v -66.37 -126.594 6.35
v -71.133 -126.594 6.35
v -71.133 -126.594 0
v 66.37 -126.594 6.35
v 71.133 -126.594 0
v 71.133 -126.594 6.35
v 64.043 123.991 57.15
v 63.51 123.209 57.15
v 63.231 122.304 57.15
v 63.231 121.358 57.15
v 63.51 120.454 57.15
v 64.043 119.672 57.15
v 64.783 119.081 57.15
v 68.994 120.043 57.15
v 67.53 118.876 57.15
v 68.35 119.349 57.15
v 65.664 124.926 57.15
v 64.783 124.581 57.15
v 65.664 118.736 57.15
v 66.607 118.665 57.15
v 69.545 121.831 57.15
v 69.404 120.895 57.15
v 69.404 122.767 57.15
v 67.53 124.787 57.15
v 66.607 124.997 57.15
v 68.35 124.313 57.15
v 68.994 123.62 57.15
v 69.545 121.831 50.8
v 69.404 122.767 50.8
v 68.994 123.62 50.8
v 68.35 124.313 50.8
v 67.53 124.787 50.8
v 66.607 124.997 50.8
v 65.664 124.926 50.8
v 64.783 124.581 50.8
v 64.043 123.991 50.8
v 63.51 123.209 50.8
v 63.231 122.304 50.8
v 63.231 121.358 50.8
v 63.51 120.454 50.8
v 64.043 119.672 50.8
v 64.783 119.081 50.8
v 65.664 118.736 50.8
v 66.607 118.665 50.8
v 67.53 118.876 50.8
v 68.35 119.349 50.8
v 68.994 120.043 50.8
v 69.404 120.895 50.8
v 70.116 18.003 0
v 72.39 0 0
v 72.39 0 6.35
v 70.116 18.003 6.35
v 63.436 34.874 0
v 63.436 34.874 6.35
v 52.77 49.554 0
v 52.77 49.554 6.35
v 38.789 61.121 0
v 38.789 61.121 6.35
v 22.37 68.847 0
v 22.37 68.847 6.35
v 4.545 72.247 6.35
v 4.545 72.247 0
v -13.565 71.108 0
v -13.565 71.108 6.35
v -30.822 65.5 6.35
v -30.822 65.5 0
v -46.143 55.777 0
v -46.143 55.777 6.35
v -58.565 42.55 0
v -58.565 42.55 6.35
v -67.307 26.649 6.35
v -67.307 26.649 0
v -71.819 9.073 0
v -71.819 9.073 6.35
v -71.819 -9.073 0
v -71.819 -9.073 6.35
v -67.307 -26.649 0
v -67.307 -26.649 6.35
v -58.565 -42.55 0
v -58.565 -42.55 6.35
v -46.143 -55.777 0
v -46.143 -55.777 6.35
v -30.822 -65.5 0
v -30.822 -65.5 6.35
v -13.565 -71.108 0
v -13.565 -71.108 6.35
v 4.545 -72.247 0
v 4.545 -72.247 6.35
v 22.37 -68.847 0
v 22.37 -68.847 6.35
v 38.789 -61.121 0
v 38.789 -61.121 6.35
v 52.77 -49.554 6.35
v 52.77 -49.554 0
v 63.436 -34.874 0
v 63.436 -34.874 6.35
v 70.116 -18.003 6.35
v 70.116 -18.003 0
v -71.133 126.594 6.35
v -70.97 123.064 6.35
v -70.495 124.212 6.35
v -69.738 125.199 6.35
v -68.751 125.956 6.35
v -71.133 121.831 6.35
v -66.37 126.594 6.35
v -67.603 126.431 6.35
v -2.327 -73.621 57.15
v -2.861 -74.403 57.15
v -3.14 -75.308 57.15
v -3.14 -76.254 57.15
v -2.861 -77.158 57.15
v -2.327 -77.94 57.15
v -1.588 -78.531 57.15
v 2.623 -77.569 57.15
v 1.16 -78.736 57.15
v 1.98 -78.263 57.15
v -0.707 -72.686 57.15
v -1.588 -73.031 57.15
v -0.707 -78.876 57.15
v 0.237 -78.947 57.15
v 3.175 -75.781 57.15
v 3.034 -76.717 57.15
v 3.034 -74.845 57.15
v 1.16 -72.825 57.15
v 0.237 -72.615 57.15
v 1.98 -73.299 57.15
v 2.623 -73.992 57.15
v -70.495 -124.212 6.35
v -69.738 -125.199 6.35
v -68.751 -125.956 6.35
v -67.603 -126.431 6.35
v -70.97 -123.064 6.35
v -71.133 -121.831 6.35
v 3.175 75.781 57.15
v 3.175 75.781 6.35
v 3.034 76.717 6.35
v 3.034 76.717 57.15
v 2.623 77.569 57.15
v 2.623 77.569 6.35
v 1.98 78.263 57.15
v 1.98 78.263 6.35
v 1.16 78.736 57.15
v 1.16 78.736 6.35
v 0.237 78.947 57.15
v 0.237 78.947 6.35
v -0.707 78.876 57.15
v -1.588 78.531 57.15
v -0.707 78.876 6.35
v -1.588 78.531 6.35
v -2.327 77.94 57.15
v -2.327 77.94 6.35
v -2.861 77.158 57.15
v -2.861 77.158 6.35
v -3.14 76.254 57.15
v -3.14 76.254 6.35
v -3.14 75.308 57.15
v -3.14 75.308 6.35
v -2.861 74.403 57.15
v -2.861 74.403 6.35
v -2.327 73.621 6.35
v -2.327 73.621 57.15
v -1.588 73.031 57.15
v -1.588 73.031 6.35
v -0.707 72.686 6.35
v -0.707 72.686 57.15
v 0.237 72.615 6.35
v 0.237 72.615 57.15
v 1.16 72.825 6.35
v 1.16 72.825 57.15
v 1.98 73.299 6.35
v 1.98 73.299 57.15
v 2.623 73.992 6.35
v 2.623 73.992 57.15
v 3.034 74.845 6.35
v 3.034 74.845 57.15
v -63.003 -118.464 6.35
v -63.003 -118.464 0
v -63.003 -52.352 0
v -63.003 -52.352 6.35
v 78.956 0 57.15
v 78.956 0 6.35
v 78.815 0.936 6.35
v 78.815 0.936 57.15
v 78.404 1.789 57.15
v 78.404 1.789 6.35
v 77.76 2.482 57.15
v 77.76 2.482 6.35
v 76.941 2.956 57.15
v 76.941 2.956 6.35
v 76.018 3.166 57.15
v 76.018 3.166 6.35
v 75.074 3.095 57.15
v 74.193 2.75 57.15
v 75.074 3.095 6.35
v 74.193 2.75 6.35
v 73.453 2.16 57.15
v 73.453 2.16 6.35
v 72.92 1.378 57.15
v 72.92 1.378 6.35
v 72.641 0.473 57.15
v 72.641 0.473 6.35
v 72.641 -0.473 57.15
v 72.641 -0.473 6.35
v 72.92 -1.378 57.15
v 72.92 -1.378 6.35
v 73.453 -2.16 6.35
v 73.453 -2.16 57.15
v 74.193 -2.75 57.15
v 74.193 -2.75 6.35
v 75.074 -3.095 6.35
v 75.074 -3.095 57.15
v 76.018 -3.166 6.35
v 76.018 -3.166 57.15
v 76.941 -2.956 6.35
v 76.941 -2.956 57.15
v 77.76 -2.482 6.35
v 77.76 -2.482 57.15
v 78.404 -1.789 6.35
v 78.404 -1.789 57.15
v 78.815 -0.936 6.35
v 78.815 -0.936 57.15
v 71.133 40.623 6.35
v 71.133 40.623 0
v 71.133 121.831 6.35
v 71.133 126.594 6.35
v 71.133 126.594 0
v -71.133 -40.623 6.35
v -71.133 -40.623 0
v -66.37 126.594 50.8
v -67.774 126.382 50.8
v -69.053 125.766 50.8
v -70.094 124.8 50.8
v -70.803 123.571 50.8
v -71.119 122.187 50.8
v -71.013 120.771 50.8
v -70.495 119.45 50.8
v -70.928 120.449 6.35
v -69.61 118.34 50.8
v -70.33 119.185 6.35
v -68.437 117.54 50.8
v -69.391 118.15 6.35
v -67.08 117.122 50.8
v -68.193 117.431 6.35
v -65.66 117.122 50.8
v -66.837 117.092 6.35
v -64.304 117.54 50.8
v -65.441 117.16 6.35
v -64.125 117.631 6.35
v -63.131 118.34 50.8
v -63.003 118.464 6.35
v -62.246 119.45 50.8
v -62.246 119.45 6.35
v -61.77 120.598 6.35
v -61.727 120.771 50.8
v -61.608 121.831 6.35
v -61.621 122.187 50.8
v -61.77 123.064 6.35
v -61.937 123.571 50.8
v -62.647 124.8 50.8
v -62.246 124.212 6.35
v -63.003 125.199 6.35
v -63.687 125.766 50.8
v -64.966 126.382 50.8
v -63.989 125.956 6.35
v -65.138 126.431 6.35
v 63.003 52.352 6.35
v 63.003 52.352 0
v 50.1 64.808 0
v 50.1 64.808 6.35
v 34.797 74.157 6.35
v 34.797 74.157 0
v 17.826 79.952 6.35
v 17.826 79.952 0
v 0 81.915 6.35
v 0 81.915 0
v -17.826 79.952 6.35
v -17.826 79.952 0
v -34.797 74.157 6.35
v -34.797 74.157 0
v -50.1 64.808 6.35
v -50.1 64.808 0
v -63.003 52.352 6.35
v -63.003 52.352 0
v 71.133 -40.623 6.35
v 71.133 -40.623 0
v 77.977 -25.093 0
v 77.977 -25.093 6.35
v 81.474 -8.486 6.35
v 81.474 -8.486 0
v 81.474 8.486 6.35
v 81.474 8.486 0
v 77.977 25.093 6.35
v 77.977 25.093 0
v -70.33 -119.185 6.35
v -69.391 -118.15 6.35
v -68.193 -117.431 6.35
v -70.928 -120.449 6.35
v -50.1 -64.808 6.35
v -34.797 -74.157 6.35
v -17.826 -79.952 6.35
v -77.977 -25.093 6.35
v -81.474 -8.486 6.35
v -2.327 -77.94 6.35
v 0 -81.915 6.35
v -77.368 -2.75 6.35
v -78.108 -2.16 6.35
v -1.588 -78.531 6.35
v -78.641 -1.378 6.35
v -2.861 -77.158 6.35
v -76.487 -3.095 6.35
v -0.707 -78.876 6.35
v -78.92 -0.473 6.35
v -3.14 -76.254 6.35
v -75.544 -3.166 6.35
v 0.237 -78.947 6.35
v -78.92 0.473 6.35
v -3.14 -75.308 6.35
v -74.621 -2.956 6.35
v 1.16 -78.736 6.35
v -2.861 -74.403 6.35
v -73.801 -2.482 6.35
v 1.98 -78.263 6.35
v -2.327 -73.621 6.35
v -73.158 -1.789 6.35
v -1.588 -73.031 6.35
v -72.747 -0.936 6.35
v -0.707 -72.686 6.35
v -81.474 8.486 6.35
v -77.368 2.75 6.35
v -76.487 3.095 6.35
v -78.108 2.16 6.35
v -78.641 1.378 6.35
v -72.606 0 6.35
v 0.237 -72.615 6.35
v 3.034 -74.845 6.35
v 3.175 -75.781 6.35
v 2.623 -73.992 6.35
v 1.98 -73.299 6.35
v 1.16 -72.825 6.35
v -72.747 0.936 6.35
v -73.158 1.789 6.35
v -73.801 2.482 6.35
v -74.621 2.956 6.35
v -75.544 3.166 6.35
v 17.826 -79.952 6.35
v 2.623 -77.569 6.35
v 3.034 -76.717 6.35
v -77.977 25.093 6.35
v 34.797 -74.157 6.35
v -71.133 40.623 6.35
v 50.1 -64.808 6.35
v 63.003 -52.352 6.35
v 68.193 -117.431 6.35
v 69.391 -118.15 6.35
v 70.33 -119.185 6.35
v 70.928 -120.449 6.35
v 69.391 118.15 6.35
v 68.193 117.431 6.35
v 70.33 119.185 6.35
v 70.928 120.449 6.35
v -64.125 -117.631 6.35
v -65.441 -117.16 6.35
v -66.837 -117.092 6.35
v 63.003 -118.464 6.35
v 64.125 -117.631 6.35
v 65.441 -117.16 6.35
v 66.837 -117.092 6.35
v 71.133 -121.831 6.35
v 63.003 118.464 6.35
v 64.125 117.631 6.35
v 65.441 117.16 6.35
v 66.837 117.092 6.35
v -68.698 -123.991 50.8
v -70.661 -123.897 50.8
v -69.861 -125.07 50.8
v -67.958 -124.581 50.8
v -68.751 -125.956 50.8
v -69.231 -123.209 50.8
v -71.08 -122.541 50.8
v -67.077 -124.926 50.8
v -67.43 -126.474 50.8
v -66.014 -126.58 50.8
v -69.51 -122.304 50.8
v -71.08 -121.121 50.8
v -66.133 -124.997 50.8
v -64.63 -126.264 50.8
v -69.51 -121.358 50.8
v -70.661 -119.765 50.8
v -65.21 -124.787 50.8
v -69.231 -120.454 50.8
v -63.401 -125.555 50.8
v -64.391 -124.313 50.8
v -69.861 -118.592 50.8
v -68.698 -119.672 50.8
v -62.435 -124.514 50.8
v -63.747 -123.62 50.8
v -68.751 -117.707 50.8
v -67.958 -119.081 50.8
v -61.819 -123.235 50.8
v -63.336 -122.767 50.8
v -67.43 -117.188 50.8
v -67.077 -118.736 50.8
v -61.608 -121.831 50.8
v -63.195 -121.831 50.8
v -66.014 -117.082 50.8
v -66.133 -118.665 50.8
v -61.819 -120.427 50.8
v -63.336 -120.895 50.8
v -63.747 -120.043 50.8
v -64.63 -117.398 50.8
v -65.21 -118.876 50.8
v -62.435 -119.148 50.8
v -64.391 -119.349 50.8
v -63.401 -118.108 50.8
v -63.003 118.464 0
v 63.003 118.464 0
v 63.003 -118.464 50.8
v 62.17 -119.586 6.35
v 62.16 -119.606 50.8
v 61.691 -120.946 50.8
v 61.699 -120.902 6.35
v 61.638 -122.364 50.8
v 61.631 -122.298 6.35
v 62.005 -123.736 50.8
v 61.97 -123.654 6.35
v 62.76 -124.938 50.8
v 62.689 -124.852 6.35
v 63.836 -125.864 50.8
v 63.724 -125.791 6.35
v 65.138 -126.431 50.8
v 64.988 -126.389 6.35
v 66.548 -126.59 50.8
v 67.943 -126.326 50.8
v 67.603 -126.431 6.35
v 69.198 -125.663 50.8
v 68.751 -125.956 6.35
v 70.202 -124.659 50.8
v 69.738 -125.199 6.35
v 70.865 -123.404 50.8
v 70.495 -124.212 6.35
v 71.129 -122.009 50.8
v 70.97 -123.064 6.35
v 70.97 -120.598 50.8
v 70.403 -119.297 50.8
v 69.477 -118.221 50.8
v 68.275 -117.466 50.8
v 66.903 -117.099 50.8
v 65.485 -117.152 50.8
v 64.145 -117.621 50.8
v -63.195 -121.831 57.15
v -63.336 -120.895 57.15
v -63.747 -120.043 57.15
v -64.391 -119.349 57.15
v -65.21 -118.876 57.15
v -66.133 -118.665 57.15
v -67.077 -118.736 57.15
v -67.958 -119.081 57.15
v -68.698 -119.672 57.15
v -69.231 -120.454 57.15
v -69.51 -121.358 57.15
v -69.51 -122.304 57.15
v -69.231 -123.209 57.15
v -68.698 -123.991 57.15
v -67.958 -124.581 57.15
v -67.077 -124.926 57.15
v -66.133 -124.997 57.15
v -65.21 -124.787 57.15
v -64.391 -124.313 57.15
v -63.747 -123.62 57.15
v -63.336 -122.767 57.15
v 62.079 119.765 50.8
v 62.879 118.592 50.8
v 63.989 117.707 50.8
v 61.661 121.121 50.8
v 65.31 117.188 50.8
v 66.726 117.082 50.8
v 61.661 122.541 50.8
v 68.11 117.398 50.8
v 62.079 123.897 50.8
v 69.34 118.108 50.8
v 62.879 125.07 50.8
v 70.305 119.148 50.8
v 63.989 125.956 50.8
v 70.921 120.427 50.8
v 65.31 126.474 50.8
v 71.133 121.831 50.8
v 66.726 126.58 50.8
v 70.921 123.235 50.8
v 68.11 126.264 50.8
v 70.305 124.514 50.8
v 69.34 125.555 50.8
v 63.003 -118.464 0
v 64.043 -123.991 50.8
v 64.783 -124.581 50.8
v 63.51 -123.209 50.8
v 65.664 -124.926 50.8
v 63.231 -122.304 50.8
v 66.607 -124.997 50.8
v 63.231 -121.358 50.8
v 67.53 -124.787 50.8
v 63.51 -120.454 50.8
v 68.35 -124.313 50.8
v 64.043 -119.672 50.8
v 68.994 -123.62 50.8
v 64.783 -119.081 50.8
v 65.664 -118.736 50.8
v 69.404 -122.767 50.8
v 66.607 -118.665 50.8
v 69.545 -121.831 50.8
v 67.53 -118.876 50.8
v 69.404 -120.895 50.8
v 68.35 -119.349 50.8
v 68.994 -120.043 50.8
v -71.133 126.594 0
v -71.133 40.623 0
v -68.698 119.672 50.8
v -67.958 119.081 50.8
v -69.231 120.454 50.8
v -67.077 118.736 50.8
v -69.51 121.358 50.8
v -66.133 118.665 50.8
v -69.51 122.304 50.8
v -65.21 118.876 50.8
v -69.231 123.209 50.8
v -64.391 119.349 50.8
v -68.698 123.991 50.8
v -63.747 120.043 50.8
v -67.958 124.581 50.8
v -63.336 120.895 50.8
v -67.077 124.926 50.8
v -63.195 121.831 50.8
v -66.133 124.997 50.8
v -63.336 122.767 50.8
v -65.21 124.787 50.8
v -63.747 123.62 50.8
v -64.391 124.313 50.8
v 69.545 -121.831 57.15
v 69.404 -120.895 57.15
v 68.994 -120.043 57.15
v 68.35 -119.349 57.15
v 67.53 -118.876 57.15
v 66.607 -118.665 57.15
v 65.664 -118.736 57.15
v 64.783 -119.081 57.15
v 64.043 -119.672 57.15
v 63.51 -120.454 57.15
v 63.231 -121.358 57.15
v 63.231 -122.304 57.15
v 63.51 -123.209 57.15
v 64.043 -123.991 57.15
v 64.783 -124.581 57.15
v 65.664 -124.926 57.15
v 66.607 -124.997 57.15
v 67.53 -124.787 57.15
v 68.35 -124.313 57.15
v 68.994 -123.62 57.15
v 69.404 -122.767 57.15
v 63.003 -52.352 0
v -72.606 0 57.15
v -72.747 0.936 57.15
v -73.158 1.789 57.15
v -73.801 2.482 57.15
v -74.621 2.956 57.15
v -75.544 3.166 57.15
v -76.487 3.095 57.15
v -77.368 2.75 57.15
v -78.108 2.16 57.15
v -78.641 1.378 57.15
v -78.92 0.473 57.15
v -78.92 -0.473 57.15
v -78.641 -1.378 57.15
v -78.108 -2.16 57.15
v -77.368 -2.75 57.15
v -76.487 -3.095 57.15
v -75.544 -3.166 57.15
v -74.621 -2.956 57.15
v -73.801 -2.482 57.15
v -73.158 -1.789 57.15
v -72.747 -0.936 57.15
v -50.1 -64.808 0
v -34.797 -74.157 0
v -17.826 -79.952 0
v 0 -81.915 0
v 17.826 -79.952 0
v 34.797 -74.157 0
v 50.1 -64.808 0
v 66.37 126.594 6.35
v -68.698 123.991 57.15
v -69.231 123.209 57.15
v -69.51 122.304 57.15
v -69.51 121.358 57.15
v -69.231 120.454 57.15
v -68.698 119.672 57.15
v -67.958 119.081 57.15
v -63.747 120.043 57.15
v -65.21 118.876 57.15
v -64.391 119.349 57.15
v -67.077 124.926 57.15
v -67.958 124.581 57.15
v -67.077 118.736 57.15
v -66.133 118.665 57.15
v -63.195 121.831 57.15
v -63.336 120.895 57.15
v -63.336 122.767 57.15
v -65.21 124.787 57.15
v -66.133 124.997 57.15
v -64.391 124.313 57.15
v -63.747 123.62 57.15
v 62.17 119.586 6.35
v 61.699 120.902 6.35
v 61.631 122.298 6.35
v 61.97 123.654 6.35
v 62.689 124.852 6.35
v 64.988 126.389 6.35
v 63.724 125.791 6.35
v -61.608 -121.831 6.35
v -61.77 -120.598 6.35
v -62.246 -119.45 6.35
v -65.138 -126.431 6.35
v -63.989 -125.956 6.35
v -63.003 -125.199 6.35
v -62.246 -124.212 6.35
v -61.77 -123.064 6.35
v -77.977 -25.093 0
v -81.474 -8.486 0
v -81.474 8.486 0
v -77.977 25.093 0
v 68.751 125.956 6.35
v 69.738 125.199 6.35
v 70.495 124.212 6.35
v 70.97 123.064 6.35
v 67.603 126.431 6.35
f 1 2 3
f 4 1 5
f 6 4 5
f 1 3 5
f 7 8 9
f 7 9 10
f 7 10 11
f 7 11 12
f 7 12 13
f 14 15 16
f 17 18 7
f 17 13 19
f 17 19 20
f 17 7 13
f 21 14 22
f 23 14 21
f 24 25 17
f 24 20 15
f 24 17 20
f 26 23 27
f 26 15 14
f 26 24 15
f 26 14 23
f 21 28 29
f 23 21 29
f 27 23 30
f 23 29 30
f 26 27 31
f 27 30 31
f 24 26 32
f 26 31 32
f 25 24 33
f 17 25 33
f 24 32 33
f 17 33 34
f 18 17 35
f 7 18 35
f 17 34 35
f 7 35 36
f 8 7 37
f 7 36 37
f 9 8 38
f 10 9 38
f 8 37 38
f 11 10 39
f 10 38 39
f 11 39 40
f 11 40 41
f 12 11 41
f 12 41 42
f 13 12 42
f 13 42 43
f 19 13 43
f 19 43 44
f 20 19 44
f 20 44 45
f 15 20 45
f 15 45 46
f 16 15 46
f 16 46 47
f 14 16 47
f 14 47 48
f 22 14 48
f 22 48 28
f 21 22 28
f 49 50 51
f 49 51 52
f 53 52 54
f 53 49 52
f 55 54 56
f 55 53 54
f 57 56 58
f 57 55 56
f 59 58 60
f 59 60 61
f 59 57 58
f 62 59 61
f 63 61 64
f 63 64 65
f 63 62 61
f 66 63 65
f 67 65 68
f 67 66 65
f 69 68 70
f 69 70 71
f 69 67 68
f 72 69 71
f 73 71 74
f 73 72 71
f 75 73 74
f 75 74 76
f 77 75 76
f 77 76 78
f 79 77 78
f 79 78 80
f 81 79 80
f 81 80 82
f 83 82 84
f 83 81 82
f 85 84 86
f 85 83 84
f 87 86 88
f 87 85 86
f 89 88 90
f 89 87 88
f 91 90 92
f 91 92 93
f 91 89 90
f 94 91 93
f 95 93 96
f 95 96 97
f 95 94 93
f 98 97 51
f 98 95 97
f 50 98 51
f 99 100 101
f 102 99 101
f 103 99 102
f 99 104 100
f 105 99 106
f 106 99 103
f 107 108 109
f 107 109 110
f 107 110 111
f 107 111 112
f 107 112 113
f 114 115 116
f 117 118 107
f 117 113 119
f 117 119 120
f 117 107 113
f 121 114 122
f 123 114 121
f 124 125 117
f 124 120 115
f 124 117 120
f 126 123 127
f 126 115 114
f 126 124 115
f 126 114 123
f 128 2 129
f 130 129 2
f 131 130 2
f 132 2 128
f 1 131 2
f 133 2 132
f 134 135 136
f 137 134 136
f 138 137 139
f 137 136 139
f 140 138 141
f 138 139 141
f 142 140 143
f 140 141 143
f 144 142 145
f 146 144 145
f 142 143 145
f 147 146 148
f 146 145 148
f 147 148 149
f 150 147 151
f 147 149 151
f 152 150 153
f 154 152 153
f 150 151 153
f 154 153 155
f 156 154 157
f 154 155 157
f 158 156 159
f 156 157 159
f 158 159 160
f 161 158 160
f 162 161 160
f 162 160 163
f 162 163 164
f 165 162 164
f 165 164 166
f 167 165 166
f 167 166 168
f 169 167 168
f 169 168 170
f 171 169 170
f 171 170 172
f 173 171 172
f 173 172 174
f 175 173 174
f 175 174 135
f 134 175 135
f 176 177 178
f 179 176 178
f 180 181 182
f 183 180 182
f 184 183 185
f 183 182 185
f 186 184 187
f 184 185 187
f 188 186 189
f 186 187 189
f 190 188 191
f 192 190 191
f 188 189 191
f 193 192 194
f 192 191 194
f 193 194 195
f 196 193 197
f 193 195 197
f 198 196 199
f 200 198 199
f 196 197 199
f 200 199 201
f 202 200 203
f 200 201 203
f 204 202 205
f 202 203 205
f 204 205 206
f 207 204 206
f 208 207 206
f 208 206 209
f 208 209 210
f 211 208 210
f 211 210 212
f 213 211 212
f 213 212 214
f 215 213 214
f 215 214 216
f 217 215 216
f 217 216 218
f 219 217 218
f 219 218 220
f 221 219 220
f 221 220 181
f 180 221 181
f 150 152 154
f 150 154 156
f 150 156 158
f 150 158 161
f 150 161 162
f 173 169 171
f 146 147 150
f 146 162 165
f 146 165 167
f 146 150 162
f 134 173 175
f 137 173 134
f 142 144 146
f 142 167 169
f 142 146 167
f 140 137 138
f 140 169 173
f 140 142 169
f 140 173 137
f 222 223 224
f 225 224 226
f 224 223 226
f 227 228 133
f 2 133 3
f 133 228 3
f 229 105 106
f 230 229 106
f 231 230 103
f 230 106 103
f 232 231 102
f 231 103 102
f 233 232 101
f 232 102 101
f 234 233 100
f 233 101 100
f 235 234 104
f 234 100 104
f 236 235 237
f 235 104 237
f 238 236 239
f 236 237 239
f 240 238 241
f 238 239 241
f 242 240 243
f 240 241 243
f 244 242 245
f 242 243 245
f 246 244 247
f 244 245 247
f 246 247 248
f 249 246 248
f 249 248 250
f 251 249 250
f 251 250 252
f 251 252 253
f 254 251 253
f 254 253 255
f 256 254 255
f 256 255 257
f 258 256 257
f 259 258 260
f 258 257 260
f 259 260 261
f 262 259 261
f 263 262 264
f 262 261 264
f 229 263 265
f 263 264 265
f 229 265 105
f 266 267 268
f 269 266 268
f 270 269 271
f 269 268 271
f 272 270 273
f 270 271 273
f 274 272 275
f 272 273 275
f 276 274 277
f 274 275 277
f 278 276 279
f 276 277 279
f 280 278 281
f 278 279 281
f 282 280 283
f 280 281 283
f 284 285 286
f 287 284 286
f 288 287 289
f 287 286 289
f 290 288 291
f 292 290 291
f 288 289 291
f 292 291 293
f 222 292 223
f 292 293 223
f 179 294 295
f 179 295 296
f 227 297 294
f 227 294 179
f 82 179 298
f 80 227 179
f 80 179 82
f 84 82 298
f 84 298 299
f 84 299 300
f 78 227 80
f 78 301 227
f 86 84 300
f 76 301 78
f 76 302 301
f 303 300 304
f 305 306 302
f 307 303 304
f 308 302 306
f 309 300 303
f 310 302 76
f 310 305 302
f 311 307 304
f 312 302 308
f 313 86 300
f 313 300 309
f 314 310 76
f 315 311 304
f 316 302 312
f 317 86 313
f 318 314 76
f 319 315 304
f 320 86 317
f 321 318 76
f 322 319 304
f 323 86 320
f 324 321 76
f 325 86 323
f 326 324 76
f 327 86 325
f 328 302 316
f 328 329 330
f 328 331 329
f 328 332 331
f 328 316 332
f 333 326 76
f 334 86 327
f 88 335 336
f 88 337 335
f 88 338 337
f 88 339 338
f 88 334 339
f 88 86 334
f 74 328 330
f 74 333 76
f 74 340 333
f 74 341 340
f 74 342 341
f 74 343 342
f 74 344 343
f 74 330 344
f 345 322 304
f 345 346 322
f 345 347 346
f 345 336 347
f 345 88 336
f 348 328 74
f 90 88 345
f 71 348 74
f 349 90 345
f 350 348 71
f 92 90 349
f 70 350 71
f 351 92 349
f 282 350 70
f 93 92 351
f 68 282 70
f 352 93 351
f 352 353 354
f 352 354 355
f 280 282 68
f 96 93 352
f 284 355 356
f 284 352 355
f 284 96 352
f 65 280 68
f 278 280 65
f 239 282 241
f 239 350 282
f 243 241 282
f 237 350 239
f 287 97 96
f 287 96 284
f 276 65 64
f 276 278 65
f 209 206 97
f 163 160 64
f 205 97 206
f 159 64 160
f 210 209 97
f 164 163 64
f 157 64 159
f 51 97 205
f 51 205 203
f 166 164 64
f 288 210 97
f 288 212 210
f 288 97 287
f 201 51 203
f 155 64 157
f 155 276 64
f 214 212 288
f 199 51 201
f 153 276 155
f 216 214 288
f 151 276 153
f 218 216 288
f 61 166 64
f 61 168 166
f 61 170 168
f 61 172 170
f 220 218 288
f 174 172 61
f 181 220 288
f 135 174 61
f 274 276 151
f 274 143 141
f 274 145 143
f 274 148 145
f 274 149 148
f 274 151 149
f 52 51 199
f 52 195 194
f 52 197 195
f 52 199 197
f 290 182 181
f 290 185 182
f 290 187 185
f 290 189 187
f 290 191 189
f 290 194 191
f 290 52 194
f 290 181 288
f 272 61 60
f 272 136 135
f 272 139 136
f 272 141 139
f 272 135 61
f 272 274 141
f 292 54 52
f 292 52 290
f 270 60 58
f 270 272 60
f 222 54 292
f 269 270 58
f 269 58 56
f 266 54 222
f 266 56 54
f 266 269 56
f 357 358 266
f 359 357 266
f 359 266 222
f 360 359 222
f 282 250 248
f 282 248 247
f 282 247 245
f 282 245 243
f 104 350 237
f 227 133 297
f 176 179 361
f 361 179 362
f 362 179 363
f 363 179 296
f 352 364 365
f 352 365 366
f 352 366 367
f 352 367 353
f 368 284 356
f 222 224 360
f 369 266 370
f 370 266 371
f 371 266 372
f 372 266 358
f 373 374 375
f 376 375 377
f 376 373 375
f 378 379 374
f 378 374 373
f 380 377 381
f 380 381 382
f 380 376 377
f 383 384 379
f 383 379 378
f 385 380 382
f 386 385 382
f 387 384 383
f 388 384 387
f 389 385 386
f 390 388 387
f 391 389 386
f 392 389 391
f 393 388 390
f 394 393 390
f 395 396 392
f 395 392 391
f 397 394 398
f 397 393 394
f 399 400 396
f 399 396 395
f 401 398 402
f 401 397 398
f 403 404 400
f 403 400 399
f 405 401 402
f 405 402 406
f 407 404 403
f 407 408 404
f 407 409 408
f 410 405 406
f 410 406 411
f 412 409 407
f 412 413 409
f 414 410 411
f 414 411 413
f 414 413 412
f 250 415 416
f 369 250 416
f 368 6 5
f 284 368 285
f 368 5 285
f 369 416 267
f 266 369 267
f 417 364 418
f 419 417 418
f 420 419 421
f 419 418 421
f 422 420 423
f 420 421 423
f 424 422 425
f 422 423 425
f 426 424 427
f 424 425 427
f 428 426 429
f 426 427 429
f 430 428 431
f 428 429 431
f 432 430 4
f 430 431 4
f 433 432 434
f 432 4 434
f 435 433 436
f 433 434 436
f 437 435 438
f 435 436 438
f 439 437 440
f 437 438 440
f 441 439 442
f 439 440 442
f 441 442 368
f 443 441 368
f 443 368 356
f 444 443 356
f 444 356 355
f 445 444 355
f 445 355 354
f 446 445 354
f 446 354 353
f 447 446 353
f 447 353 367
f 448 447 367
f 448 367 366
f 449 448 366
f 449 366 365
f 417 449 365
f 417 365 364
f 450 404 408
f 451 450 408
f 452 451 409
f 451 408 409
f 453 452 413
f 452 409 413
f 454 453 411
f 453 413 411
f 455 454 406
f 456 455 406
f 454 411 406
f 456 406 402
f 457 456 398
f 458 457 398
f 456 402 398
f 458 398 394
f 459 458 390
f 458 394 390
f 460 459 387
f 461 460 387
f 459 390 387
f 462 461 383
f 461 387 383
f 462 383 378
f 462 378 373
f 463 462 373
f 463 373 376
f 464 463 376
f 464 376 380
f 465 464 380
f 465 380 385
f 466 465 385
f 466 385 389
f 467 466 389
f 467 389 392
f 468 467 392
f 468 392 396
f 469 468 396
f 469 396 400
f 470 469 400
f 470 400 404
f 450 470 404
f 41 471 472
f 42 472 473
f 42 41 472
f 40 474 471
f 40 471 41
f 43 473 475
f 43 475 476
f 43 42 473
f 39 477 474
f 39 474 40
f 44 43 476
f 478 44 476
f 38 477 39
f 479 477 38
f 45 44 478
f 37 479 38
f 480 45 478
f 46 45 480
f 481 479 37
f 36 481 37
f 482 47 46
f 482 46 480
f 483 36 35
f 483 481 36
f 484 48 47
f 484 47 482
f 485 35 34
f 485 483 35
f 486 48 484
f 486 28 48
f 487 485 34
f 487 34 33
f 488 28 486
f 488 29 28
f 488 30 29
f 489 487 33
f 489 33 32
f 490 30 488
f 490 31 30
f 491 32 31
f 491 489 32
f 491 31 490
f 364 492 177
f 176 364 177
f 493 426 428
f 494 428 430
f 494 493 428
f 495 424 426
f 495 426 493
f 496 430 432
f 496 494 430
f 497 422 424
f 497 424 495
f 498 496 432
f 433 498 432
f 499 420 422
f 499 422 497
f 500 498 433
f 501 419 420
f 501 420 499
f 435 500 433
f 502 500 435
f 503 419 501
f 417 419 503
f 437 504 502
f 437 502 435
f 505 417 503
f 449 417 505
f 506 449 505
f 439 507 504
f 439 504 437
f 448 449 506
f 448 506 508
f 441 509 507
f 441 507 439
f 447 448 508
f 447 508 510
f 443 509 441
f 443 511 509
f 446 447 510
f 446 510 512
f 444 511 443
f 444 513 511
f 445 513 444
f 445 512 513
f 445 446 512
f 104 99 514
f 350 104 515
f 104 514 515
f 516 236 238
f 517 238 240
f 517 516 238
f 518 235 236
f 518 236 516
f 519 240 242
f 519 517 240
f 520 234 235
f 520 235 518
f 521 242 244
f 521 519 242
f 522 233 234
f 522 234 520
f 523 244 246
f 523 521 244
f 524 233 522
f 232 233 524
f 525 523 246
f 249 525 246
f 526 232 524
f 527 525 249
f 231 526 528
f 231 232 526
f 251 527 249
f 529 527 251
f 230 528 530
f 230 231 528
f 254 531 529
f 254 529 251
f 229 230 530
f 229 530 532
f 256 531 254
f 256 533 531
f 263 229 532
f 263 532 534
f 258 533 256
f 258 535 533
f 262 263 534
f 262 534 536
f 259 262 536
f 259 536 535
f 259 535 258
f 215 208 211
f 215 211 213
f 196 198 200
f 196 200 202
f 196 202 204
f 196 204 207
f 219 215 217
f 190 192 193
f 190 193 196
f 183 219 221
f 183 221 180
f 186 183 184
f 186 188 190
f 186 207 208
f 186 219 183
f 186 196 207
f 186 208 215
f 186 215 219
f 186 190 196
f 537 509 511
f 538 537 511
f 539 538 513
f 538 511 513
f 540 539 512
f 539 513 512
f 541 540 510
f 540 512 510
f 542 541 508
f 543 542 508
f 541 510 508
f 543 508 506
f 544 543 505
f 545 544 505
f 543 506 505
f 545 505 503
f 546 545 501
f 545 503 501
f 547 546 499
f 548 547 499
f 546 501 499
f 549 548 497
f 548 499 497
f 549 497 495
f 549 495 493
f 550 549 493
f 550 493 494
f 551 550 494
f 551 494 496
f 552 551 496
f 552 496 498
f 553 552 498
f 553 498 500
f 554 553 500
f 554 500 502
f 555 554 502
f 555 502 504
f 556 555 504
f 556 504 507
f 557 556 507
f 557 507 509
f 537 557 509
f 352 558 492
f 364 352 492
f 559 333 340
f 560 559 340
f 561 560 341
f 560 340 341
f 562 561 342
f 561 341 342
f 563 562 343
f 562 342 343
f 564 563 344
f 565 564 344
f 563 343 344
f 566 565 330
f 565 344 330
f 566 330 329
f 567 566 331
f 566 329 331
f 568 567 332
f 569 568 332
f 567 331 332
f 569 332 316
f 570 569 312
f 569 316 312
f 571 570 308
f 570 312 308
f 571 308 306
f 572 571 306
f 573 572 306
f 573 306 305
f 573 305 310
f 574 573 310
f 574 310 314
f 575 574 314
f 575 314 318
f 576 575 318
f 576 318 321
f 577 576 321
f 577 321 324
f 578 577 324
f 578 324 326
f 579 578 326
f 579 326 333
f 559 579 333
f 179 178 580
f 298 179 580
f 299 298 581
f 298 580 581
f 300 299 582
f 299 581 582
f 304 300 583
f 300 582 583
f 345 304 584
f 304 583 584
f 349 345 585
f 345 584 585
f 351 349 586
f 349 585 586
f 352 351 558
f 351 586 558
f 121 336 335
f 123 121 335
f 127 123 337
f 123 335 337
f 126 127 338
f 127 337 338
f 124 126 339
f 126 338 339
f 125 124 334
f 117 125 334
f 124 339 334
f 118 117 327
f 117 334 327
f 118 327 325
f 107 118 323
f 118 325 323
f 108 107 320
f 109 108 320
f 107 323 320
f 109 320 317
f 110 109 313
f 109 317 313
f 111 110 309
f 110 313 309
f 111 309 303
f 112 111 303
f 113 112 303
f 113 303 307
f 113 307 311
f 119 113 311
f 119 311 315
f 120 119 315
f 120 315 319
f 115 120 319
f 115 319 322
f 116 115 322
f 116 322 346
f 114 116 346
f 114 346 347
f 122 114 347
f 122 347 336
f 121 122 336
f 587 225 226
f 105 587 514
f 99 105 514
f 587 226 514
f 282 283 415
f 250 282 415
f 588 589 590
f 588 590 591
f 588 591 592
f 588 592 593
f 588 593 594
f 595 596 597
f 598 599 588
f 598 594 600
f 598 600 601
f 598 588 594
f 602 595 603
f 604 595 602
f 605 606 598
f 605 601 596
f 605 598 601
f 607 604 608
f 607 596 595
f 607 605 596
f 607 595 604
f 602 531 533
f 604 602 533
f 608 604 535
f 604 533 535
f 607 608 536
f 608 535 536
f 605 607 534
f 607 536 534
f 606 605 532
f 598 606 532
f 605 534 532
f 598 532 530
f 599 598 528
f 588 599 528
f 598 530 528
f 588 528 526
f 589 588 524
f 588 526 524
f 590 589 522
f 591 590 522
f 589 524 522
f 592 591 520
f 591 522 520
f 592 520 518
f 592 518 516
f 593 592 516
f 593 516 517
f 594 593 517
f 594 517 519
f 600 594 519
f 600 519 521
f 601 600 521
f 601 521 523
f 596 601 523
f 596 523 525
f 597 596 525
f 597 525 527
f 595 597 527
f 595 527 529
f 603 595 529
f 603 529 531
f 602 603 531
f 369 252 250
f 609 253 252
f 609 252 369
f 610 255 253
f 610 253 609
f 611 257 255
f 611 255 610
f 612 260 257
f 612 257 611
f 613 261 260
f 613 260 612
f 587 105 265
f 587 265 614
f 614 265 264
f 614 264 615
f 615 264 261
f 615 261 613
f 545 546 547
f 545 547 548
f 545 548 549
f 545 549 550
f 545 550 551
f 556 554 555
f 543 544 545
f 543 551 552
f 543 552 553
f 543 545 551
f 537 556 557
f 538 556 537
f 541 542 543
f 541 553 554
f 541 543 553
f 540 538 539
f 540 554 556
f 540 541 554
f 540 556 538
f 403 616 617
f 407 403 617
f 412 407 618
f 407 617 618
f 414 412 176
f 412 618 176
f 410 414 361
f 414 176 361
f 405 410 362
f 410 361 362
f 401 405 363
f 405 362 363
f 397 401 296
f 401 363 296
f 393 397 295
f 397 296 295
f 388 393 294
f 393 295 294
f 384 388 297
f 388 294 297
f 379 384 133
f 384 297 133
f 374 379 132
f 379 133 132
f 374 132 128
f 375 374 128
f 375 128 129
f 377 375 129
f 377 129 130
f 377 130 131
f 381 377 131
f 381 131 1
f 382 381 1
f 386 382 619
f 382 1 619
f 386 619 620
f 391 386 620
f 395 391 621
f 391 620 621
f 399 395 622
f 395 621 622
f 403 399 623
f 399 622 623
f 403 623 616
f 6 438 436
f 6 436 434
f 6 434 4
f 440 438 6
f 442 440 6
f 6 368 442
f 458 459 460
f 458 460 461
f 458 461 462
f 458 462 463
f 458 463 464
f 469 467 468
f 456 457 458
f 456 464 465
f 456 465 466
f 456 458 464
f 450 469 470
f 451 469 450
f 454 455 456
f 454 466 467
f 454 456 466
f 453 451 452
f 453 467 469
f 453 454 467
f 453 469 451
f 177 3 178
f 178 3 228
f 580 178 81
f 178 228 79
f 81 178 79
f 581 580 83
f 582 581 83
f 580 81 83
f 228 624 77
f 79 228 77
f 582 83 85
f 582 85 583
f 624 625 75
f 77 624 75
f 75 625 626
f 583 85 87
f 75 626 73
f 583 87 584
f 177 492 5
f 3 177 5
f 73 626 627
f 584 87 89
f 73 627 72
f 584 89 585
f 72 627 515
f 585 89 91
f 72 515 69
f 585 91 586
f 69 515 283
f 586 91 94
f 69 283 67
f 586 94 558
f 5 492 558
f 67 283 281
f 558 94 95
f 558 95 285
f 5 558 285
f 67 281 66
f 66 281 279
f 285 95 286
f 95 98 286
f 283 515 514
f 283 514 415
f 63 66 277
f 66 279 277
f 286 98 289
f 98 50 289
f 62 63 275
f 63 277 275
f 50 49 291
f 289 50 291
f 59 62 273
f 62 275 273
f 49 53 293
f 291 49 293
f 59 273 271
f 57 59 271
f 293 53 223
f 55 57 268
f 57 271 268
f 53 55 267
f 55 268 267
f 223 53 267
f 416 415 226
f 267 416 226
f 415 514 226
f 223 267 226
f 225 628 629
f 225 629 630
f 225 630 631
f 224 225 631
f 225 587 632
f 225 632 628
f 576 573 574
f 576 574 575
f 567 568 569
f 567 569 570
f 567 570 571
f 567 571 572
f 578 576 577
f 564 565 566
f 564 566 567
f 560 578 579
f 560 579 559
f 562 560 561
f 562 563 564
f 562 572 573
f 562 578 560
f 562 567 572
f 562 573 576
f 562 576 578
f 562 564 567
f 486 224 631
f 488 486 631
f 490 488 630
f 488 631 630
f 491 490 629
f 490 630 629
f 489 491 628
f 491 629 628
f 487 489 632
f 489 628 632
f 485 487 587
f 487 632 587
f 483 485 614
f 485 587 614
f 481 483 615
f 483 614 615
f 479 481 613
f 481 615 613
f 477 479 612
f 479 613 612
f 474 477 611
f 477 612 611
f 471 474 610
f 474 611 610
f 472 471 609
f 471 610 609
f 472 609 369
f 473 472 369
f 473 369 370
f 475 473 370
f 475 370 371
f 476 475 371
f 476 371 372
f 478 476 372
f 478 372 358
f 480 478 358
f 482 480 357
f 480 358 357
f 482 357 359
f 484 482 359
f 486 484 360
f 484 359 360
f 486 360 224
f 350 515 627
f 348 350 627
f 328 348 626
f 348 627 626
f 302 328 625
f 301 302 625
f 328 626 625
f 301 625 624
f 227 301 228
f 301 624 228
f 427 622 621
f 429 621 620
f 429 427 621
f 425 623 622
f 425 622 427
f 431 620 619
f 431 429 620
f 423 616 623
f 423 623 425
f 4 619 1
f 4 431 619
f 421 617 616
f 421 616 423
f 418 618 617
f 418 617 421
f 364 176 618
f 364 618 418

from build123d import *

# Parameters (mm, degrees)
F0_R     = 3.175
F0_R_2   = 72.39
F1_DEPTH = 6.35
F2_DEPTH = 50.8
F3_DEPTH = 57.15
F4_DEPTH = 57.15


with BuildPart() as f1:
    # F0 (on Top) → F1 (new body)
    with BuildSketch(Plane.XY):
        with BuildLine():
            Line((-63.0026039546, 52.3520689175), (-63.0026039546, 118.4635039546))
            ThreePointArc((-63.0026039546, 118.4635039546), (-68.1927298466, 117.4311237264), (-71.1327, 121.8311))
            Line((-71.1327, 121.8311), (-71.1327, 40.6227302838))
            ThreePointArc((-71.1327, 40.6227302838), (-81.915, 0), (-71.1327, -40.6227302838))
            Line((-71.1327, -40.6227302838), (-71.1327, -121.8311))
            ThreePointArc((-71.1327, -121.8311), (-68.1927298466, -117.4311237264), (-63.0026039546, -118.4635039546))
            Line((-63.0026039546, -118.4635039546), (-63.0026039546, -52.3520689175))
            ThreePointArc((-63.0026039546, -52.3520689175), (0, -81.915), (63.0026039546, -52.3520689175))
            Line((63.0026039546, -52.3520689175), (63.0026039546, -118.4635039546))
            ThreePointArc((63.0026039546, -118.4635039546), (68.1927298466, -117.4311237264), (71.1327, -121.8311))
            Line((71.1327, -121.8311), (71.1327, -40.6227302838))
            ThreePointArc((71.1327, -40.6227302838), (81.915, 0), (71.1327, 40.6227302838))
            Line((71.1327, 40.6227302838), (71.1327, 121.8311))
            ThreePointArc((71.1327, 121.8311), (68.1927298466, 117.4311237264), (63.0026039546, 118.4635039546))
            Line((63.0026039546, 118.4635039546), (63.0026039546, 52.3520689175))
            ThreePointArc((63.0026039546, 52.3520689175), (0, 81.915), (-63.0026039546, 52.3520689175))
        make_face()
        with Locations((0, -75.7809)):
            Circle(F0_R, mode=Mode.SUBTRACT)
        with Locations((-75.7809, 0)):
            Circle(F0_R, mode=Mode.SUBTRACT)
        Circle(F0_R_2, mode=Mode.SUBTRACT)
        with Locations((75.7809, 0)):
            Circle(F0_R, mode=Mode.SUBTRACT)
        with Locations((0, 75.7809)):
            Circle(F0_R, mode=Mode.SUBTRACT)
    extrude(amount=F1_DEPTH)



with BuildPart() as f1b:
    # F0 (on Top) → F1, piece 2 (new body)
    with BuildSketch(Plane.XY):
        with BuildLine():
            ThreePointArc((-61.6077, 121.8311), (-61.9702237264, 120.0085701534), (-63.0026039546, 118.4635039546))
            Line((-63.0026039546, 118.4635039546), (63.0026039546, 118.4635039546))
            ThreePointArc((63.0026039546, 118.4635039546), (61.9702237264, 123.6536298466), (66.3702, 126.5936))
            Line((66.3702, 126.5936), (-66.3702, 126.5936))
            ThreePointArc((-66.3702, 126.5936), (-63.0026039546, 125.1986960454), (-61.6077, 121.8311))
        make_face()
    extrude(amount=F1_DEPTH)


with BuildPart() as f1c:
    # F0 (on Top) → F1, piece 3 (new body)
    with BuildSketch(Plane.XY):
        with BuildLine():
            Line((63.0026039546, -118.4635039546), (-63.0026039546, -118.4635039546))
            ThreePointArc((-63.0026039546, -118.4635039546), (-61.9702237264, -120.0085701534), (-61.6077, -121.8311))
            ThreePointArc((-61.6077, -121.8311), (-63.0026039546, -125.1986960454), (-66.3702, -126.5936))
            Line((-66.3702, -126.5936), (66.3702, -126.5936))
            ThreePointArc((66.3702, -126.5936), (61.9702237264, -123.6536298466), (63.0026039546, -118.4635039546))
        make_face()
    extrude(amount=F1_DEPTH)


with BuildPart() as f1d:
    # F0 (on Top) → F1, piece 4 (new body)
    with BuildSketch(Plane.XY):
        with BuildLine():
            ThreePointArc((-66.3702, -126.5936), (-69.7377960454, -125.1986960454), (-71.1327, -121.8311))
            Line((-71.1327, -121.8311), (-71.1327, -126.5936))
            Line((-71.1327, -126.5936), (-66.3702, -126.5936))
        make_face()
    extrude(amount=F1_DEPTH)


with BuildPart() as f1e:
    # F0 (on Top) → F1, piece 5 (new body)
    with BuildSketch(Plane.XY):
        with BuildLine():
            Line((71.1327, -126.5936), (71.1327, -121.8311))
            ThreePointArc((71.1327, -121.8311), (69.7377960454, -125.1986960454), (66.3702, -126.5936))
            Line((66.3702, -126.5936), (71.1327, -126.5936))
        make_face()
    extrude(amount=F1_DEPTH)


with BuildPart() as f1f:
    # F0 (on Top) → F1, piece 6 (new body)
    with BuildSketch(Plane.XY):
        with BuildLine():
            Line((-71.1327, 126.5936), (-71.1327, 121.8311))
            ThreePointArc((-71.1327, 121.8311), (-69.7377960454, 125.1986960454), (-66.3702, 126.5936))
            Line((-66.3702, 126.5936), (-71.1327, 126.5936))
        make_face()
    extrude(amount=F1_DEPTH)


with BuildPart() as f1g:
    # F0 (on Top) → F1, piece 7 (new body)
    with BuildSketch(Plane.XY):
        with BuildLine():
            ThreePointArc((66.3702, 126.5936), (69.7377960454, 125.1986960454), (71.1327, 121.8311))
            Line((71.1327, 121.8311), (71.1327, 126.5936))
            Line((71.1327, 126.5936), (66.3702, 126.5936))
        make_face()
    extrude(amount=F1_DEPTH)


with BuildPart() as f1_1:
    add(f1.part)

    add(f1b.part)  # F2 merges F1b

    add(f1c.part)  # F2 merges F1c

    add(f1d.part)  # F2 merges F1d

    add(f1e.part)  # F2 merges F1e

    add(f1f.part)  # F2 merges F1f

    add(f1g.part)  # F2 merges F1g
    # F0 (on Top) → F2 (join)
    with BuildSketch(Plane.XY):
        with BuildLine():
            ThreePointArc((-71.1327, 121.8311), (-68.1927298466, 117.4311237264), (-63.0026039546, 118.4635039546))
            ThreePointArc((-63.0026039546, 118.4635039546), (-61.9702237264, 120.0085701534), (-61.6077, 121.8311))
            ThreePointArc((-61.6077, 121.8311), (-63.0026039546, 125.1986960454), (-66.3702, 126.5936))
            ThreePointArc((-66.3702, 126.5936), (-69.7377960454, 125.1986960454), (-71.1327, 121.8311))
        make_face()
        with Locations((-66.3702, 121.8311)):
            Circle(F0_R, mode=Mode.SUBTRACT)
        with BuildLine():
            ThreePointArc((66.3702, 126.5936), (61.9702237264, 123.6536298466), (63.0026039546, 118.4635039546))
            ThreePointArc((63.0026039546, 118.4635039546), (68.1927298466, 117.4311237264), (71.1327, 121.8311))
            ThreePointArc((71.1327, 121.8311), (69.7377960454, 125.1986960454), (66.3702, 126.5936))
        make_face()
        with Locations((66.3702, 121.8311)):
            Circle(F0_R, mode=Mode.SUBTRACT)
        with BuildLine():
            ThreePointArc((-63.0026039546, -118.4635039546), (-68.1927298466, -117.4311237264), (-71.1327, -121.8311))
            ThreePointArc((-71.1327, -121.8311), (-69.7377960454, -125.1986960454), (-66.3702, -126.5936))
            ThreePointArc((-66.3702, -126.5936), (-63.0026039546, -125.1986960454), (-61.6077, -121.8311))
            ThreePointArc((-61.6077, -121.8311), (-61.9702237264, -120.0085701534), (-63.0026039546, -118.4635039546))
        make_face()
        with Locations((-66.3702, -121.8311)):
            Circle(F0_R, mode=Mode.SUBTRACT)
        with BuildLine():
            ThreePointArc((66.3702, -126.5936), (69.7377960454, -125.1986960454), (71.1327, -121.8311))
            ThreePointArc((71.1327, -121.8311), (68.1927298466, -117.4311237264), (63.0026039546, -118.4635039546))
            ThreePointArc((63.0026039546, -118.4635039546), (61.9702237264, -123.6536298466), (66.3702, -126.5936))
        make_face()
        with Locations((66.3702, -121.8311)):
            Circle(F0_R, mode=Mode.SUBTRACT)
    extrude(amount=F2_DEPTH)

    # F0 (on Top) → F3 (join)
    with BuildSketch(Plane.XY):
        with Locations((66.3702, -121.8311)):
            Circle(F0_R)
        with Locations((-66.3702, -121.8311)):
            Circle(F0_R)
        with Locations((66.3702, 121.8311)):
            Circle(F0_R)
        with Locations((-66.3702, 121.8311)):
            Circle(F0_R)
    extrude(amount=F3_DEPTH)

    # F0 (on Top) → F4 (join)
    with BuildSketch(Plane.XY):
        with Locations((0, 75.7809)):
            Circle(F0_R)
        with Locations((-75.7809, 0)):
            Circle(F0_R)
        with Locations((75.7809, 0)):
            Circle(F0_R)
        with Locations((0, -75.7809)):
            Circle(F0_R)
    extrude(amount=F4_DEPTH)


solid = f1_1.part
